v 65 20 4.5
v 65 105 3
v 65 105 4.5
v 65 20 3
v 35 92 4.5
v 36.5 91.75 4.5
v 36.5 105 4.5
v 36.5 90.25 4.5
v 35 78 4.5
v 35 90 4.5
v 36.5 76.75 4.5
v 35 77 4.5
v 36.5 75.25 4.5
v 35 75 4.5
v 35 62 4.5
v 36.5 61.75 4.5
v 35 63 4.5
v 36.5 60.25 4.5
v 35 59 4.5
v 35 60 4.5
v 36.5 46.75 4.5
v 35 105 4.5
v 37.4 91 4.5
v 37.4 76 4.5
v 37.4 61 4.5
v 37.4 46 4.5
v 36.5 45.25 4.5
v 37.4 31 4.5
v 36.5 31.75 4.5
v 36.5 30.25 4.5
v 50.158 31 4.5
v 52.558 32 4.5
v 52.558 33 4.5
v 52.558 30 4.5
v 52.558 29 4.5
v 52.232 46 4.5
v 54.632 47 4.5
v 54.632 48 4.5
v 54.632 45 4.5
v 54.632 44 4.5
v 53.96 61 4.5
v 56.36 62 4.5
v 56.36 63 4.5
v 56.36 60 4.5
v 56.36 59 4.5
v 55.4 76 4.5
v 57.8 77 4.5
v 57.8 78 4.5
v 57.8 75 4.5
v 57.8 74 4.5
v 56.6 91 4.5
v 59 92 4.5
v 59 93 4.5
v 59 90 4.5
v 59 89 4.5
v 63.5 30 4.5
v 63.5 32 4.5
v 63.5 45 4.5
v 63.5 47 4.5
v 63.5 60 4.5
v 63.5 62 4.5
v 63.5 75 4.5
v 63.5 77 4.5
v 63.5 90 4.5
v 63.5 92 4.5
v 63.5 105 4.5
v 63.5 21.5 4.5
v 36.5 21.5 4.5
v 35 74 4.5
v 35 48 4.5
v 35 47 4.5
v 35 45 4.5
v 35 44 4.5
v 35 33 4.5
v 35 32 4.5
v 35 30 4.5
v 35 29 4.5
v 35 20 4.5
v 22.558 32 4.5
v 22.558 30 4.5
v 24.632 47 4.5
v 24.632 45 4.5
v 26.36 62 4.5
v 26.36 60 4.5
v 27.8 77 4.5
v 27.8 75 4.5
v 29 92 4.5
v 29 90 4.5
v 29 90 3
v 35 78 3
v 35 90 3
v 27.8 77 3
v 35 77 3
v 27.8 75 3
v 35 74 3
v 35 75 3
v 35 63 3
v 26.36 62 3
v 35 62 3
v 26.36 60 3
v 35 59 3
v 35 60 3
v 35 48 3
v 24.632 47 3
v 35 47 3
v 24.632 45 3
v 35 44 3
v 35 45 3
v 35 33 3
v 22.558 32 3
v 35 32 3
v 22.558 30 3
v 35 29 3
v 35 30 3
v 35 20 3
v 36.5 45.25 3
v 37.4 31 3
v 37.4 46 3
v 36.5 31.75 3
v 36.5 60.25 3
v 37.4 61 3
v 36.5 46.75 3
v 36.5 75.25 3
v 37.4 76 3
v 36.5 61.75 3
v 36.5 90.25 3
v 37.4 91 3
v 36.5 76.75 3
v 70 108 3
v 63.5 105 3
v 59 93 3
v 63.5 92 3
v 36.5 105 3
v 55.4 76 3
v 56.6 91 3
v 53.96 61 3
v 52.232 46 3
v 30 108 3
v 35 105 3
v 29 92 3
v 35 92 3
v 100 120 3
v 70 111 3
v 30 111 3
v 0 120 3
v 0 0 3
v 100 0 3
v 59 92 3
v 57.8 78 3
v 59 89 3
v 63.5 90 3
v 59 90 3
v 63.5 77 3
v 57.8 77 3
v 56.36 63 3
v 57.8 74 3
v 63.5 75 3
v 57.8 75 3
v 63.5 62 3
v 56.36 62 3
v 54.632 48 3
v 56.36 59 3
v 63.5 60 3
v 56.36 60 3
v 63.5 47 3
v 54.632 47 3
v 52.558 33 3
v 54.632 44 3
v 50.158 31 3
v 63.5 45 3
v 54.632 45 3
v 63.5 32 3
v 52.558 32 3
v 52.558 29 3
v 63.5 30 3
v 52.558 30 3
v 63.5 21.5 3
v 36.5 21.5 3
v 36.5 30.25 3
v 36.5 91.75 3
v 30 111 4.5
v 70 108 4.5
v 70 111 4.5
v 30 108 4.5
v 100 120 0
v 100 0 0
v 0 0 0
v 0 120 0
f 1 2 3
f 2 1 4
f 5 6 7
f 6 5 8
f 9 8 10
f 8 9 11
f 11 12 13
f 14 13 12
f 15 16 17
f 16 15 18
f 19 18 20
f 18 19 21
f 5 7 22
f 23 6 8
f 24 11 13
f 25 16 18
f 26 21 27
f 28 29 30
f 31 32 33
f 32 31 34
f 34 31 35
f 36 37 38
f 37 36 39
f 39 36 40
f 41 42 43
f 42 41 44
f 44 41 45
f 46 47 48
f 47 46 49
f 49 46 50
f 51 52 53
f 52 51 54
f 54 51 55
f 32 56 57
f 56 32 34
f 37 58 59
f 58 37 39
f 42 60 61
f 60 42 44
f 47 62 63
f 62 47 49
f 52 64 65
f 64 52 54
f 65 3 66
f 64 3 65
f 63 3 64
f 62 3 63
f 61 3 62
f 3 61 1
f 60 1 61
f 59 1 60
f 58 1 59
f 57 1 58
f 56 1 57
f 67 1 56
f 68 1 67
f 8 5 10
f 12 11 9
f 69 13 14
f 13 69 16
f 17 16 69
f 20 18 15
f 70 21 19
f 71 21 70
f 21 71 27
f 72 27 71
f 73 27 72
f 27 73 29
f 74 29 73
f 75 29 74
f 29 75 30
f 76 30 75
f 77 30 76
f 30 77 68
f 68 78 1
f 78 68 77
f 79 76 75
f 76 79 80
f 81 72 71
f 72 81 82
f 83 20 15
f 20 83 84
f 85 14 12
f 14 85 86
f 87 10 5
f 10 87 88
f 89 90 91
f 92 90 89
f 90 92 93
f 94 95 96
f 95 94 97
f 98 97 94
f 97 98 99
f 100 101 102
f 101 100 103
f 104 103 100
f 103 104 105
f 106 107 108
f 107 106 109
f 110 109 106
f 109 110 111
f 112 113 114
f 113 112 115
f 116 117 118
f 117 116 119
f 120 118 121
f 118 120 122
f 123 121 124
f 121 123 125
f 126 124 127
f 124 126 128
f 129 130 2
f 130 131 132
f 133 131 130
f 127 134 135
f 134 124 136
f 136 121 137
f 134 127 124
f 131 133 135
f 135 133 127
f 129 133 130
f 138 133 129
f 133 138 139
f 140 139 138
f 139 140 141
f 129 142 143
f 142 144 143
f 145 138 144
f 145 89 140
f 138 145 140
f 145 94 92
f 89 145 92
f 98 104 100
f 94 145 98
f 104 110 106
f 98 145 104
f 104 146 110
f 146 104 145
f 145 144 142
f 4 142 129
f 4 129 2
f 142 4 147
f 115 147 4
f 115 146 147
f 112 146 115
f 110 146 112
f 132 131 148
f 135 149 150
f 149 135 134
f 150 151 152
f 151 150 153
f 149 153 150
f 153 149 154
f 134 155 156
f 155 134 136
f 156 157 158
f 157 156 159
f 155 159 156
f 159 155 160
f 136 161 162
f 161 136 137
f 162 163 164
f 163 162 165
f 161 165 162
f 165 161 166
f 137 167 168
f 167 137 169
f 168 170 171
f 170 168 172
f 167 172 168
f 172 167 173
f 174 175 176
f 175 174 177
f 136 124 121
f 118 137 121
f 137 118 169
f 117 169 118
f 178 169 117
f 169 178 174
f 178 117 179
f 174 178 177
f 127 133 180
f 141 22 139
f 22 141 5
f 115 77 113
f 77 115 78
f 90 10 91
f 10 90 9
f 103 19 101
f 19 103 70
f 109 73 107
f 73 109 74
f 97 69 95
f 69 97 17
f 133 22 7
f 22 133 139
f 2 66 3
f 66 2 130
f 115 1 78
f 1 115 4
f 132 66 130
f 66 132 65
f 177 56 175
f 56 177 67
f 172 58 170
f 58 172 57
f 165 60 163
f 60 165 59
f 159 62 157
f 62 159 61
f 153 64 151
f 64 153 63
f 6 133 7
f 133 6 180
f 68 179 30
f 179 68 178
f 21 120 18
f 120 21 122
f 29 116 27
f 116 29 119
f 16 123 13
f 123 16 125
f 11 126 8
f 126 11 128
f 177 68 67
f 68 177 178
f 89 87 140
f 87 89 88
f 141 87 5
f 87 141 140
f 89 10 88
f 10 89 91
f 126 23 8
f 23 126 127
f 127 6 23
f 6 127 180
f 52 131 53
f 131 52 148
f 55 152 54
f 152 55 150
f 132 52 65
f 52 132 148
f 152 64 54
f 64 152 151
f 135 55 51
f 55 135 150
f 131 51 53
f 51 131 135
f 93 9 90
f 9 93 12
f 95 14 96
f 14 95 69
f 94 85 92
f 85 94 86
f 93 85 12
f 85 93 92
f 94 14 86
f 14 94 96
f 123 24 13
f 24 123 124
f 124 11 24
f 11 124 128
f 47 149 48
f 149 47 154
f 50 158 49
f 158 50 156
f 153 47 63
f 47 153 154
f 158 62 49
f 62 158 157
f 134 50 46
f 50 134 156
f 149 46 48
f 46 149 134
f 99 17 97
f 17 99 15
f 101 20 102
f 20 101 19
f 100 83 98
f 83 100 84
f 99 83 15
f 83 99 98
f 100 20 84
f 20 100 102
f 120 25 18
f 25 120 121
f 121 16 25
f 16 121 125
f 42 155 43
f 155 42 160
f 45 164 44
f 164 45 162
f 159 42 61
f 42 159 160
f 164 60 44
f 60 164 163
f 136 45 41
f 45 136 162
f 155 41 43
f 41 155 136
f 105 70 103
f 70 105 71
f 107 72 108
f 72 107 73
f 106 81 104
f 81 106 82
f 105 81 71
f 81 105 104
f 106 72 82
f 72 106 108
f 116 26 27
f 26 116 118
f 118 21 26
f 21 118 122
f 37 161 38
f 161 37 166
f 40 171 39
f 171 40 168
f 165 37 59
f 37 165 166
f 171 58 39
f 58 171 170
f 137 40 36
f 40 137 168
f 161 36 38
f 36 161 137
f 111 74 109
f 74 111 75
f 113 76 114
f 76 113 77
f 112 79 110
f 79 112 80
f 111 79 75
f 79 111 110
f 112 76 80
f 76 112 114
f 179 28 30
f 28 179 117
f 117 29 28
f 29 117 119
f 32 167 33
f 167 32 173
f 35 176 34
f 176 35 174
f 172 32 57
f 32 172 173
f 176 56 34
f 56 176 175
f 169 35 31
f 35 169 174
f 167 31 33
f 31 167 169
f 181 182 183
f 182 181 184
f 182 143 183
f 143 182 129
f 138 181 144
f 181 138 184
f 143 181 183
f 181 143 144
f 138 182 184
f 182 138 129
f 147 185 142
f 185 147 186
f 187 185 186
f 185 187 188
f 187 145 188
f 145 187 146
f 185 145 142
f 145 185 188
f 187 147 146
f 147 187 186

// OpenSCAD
/*
 * Title: Pressure with Depth Visualization Board
 * Folder: 15_fluids_pressure
 * Physics Topic: Fluid Pressure, P = ρgh, Pascal's Principle
 * Difficulty: Beginner
 * Print Type: flat
 * Teaches: Pressure increases linearly with depth, pressure acts in all directions
 * Use Case: Wall-mount or table-display board for pressure-depth demonstrations
 */

// --------------------
// Parameters
// --------------------
board_width          = 100;  // mm
board_height         = 120;  // mm
board_thickness      = 3;    // mm
water_column_width   = 30;   // mm — width of the fluid container outline
depth_tick_spacing   = 15;   // mm — vertical spacing between depth levels
show_pressure_arrows = true;
arrow_scale_factor   = 1.2;  // each deeper arrow is this times longer
depth_levels         = 5;    // number of depth increments

// --------------------
// Physics Meaning
// --------------------
// Pressure at depth h:  P = ρ · g · h
// ρ = fluid density (kg/m³), g = 9.8 m/s², h = depth below surface
// Pressure is isotropic (same in all directions at a given depth).
// The arrows grow longer with depth to show the linear relationship.

// --------------------
// Learning Notes
// --------------------
// - At the surface (h=0): P = 0 gauge pressure (just atmospheric)
// - Deeper arrows represent greater hydrostatic pressure
// - Arrows point INWARD from both sides — pressure acts from all directions
// - This linear relationship holds for incompressible fluids

// --------------------
// Print Notes
// --------------------
// - Print flat on bed; no supports needed
// - 0.2 mm layer height for readable raised labels
// - Consider filament color swap on layer 2 for contrast on arrows

// --------------------
// Customization Ideas
// --------------------
// - Increase arrow_scale_factor to 1.5 for more dramatic pressure difference
// - Add a curved pressure profile line connecting arrow tips
// - Increase depth_levels to 8 for a taller board

$fn = 32;

feature_h     = 1.5;   // mm raised above board surface
arrow_w       = 2;     // mm arrow shaft width
container_wall = 1.5;  // mm container outline wall thickness
container_x   = (board_width - water_column_width) / 2;  // left edge of container

// --------------------
// Board base
// --------------------
module board_base() {
  cube([board_width, board_height, board_thickness]);
}

// --------------------
// Fluid container outline (raised rectangle)
// --------------------
module container_outline() {
  container_h = depth_levels * depth_tick_spacing + 10;
  container_y = board_height - container_h - 15;

  translate([container_x, container_y, board_thickness])
    difference() {
      cube([water_column_width, container_h, feature_h]);
      translate([container_wall, container_wall, -1])
        cube([water_column_width - 2*container_wall,
              container_h - container_wall, feature_h + 2]);
    }
}

// --------------------
// Single pressure arrow (pointing inward from left or right)
// --------------------
module pressure_arrow(arrow_len, direction) {
  // direction: 1 = pointing right (from left wall), -1 = pointing left (from right wall)
  mirror(direction == -1 ? [1,0,0] : [0,0,0])
    union() {
      // Shaft
      cube([arrow_len, arrow_w, feature_h]);
      // Arrowhead
      translate([arrow_len, arrow_w/2, 0])
        linear_extrude(height=feature_h)
          polygon([[0, -arrow_w], [0, arrow_w], [arrow_w*1.2, 0]]);
    }
}

// --------------------
// All pressure arrows at each depth level
// --------------------
module all_pressure_arrows() {
  container_h  = depth_levels * depth_tick_spacing + 10;
  container_y  = board_height - container_h - 15;
  base_arrow_l = 6;  // mm — shortest arrow at shallowest depth

  for (level = [1 : depth_levels]) {
    depth_y     = container_y + container_h - level * depth_tick_spacing;
    arrow_len   = base_arrow_l * pow(arrow_scale_factor, level - 1);

    // Left arrow (pointing right, inward)
    translate([container_x - arrow_len, depth_y, board_thickness])
      pressure_arrow(arrow_len, 1);

    // Right arrow (pointing left, inward)
    translate([container_x + water_column_width, depth_y, board_thickness])
      pressure_arrow(arrow_len, -1);

    // Depth tick mark on left side of container
    translate([container_x - 1, depth_y + arrow_w/2, board_thickness])
      cube([1, 1, feature_h * 0.5]);
  }
}

// --------------------
// P = ρgh label strip at top
// --------------------
module equation_label() {
  // Raised bar as placeholder for equation label
  translate([board_width/2 - 20, board_height - 12, board_thickness])
    cube([40, 3, feature_h]);
  // Small raised dots spelling out label structure
  for (xi = [0:4]) {
    translate([board_width/2 - 18 + xi*9, board_height - 10, board_thickness])
      cylinder(h=feature_h, d=1.5, $fn=8);
  }
}

// --------------------
// pressure_depth_board() — main model
// --------------------
module pressure_depth_board() {
  union() {
    board_base();
    container_outline();
    if (show_pressure_arrows) all_pressure_arrows();
    equation_label();
  }
}

// --------------------
// demo_default()
// --------------------
module demo_default() {
  pressure_depth_board();
}

// Run default demo
demo_default();
